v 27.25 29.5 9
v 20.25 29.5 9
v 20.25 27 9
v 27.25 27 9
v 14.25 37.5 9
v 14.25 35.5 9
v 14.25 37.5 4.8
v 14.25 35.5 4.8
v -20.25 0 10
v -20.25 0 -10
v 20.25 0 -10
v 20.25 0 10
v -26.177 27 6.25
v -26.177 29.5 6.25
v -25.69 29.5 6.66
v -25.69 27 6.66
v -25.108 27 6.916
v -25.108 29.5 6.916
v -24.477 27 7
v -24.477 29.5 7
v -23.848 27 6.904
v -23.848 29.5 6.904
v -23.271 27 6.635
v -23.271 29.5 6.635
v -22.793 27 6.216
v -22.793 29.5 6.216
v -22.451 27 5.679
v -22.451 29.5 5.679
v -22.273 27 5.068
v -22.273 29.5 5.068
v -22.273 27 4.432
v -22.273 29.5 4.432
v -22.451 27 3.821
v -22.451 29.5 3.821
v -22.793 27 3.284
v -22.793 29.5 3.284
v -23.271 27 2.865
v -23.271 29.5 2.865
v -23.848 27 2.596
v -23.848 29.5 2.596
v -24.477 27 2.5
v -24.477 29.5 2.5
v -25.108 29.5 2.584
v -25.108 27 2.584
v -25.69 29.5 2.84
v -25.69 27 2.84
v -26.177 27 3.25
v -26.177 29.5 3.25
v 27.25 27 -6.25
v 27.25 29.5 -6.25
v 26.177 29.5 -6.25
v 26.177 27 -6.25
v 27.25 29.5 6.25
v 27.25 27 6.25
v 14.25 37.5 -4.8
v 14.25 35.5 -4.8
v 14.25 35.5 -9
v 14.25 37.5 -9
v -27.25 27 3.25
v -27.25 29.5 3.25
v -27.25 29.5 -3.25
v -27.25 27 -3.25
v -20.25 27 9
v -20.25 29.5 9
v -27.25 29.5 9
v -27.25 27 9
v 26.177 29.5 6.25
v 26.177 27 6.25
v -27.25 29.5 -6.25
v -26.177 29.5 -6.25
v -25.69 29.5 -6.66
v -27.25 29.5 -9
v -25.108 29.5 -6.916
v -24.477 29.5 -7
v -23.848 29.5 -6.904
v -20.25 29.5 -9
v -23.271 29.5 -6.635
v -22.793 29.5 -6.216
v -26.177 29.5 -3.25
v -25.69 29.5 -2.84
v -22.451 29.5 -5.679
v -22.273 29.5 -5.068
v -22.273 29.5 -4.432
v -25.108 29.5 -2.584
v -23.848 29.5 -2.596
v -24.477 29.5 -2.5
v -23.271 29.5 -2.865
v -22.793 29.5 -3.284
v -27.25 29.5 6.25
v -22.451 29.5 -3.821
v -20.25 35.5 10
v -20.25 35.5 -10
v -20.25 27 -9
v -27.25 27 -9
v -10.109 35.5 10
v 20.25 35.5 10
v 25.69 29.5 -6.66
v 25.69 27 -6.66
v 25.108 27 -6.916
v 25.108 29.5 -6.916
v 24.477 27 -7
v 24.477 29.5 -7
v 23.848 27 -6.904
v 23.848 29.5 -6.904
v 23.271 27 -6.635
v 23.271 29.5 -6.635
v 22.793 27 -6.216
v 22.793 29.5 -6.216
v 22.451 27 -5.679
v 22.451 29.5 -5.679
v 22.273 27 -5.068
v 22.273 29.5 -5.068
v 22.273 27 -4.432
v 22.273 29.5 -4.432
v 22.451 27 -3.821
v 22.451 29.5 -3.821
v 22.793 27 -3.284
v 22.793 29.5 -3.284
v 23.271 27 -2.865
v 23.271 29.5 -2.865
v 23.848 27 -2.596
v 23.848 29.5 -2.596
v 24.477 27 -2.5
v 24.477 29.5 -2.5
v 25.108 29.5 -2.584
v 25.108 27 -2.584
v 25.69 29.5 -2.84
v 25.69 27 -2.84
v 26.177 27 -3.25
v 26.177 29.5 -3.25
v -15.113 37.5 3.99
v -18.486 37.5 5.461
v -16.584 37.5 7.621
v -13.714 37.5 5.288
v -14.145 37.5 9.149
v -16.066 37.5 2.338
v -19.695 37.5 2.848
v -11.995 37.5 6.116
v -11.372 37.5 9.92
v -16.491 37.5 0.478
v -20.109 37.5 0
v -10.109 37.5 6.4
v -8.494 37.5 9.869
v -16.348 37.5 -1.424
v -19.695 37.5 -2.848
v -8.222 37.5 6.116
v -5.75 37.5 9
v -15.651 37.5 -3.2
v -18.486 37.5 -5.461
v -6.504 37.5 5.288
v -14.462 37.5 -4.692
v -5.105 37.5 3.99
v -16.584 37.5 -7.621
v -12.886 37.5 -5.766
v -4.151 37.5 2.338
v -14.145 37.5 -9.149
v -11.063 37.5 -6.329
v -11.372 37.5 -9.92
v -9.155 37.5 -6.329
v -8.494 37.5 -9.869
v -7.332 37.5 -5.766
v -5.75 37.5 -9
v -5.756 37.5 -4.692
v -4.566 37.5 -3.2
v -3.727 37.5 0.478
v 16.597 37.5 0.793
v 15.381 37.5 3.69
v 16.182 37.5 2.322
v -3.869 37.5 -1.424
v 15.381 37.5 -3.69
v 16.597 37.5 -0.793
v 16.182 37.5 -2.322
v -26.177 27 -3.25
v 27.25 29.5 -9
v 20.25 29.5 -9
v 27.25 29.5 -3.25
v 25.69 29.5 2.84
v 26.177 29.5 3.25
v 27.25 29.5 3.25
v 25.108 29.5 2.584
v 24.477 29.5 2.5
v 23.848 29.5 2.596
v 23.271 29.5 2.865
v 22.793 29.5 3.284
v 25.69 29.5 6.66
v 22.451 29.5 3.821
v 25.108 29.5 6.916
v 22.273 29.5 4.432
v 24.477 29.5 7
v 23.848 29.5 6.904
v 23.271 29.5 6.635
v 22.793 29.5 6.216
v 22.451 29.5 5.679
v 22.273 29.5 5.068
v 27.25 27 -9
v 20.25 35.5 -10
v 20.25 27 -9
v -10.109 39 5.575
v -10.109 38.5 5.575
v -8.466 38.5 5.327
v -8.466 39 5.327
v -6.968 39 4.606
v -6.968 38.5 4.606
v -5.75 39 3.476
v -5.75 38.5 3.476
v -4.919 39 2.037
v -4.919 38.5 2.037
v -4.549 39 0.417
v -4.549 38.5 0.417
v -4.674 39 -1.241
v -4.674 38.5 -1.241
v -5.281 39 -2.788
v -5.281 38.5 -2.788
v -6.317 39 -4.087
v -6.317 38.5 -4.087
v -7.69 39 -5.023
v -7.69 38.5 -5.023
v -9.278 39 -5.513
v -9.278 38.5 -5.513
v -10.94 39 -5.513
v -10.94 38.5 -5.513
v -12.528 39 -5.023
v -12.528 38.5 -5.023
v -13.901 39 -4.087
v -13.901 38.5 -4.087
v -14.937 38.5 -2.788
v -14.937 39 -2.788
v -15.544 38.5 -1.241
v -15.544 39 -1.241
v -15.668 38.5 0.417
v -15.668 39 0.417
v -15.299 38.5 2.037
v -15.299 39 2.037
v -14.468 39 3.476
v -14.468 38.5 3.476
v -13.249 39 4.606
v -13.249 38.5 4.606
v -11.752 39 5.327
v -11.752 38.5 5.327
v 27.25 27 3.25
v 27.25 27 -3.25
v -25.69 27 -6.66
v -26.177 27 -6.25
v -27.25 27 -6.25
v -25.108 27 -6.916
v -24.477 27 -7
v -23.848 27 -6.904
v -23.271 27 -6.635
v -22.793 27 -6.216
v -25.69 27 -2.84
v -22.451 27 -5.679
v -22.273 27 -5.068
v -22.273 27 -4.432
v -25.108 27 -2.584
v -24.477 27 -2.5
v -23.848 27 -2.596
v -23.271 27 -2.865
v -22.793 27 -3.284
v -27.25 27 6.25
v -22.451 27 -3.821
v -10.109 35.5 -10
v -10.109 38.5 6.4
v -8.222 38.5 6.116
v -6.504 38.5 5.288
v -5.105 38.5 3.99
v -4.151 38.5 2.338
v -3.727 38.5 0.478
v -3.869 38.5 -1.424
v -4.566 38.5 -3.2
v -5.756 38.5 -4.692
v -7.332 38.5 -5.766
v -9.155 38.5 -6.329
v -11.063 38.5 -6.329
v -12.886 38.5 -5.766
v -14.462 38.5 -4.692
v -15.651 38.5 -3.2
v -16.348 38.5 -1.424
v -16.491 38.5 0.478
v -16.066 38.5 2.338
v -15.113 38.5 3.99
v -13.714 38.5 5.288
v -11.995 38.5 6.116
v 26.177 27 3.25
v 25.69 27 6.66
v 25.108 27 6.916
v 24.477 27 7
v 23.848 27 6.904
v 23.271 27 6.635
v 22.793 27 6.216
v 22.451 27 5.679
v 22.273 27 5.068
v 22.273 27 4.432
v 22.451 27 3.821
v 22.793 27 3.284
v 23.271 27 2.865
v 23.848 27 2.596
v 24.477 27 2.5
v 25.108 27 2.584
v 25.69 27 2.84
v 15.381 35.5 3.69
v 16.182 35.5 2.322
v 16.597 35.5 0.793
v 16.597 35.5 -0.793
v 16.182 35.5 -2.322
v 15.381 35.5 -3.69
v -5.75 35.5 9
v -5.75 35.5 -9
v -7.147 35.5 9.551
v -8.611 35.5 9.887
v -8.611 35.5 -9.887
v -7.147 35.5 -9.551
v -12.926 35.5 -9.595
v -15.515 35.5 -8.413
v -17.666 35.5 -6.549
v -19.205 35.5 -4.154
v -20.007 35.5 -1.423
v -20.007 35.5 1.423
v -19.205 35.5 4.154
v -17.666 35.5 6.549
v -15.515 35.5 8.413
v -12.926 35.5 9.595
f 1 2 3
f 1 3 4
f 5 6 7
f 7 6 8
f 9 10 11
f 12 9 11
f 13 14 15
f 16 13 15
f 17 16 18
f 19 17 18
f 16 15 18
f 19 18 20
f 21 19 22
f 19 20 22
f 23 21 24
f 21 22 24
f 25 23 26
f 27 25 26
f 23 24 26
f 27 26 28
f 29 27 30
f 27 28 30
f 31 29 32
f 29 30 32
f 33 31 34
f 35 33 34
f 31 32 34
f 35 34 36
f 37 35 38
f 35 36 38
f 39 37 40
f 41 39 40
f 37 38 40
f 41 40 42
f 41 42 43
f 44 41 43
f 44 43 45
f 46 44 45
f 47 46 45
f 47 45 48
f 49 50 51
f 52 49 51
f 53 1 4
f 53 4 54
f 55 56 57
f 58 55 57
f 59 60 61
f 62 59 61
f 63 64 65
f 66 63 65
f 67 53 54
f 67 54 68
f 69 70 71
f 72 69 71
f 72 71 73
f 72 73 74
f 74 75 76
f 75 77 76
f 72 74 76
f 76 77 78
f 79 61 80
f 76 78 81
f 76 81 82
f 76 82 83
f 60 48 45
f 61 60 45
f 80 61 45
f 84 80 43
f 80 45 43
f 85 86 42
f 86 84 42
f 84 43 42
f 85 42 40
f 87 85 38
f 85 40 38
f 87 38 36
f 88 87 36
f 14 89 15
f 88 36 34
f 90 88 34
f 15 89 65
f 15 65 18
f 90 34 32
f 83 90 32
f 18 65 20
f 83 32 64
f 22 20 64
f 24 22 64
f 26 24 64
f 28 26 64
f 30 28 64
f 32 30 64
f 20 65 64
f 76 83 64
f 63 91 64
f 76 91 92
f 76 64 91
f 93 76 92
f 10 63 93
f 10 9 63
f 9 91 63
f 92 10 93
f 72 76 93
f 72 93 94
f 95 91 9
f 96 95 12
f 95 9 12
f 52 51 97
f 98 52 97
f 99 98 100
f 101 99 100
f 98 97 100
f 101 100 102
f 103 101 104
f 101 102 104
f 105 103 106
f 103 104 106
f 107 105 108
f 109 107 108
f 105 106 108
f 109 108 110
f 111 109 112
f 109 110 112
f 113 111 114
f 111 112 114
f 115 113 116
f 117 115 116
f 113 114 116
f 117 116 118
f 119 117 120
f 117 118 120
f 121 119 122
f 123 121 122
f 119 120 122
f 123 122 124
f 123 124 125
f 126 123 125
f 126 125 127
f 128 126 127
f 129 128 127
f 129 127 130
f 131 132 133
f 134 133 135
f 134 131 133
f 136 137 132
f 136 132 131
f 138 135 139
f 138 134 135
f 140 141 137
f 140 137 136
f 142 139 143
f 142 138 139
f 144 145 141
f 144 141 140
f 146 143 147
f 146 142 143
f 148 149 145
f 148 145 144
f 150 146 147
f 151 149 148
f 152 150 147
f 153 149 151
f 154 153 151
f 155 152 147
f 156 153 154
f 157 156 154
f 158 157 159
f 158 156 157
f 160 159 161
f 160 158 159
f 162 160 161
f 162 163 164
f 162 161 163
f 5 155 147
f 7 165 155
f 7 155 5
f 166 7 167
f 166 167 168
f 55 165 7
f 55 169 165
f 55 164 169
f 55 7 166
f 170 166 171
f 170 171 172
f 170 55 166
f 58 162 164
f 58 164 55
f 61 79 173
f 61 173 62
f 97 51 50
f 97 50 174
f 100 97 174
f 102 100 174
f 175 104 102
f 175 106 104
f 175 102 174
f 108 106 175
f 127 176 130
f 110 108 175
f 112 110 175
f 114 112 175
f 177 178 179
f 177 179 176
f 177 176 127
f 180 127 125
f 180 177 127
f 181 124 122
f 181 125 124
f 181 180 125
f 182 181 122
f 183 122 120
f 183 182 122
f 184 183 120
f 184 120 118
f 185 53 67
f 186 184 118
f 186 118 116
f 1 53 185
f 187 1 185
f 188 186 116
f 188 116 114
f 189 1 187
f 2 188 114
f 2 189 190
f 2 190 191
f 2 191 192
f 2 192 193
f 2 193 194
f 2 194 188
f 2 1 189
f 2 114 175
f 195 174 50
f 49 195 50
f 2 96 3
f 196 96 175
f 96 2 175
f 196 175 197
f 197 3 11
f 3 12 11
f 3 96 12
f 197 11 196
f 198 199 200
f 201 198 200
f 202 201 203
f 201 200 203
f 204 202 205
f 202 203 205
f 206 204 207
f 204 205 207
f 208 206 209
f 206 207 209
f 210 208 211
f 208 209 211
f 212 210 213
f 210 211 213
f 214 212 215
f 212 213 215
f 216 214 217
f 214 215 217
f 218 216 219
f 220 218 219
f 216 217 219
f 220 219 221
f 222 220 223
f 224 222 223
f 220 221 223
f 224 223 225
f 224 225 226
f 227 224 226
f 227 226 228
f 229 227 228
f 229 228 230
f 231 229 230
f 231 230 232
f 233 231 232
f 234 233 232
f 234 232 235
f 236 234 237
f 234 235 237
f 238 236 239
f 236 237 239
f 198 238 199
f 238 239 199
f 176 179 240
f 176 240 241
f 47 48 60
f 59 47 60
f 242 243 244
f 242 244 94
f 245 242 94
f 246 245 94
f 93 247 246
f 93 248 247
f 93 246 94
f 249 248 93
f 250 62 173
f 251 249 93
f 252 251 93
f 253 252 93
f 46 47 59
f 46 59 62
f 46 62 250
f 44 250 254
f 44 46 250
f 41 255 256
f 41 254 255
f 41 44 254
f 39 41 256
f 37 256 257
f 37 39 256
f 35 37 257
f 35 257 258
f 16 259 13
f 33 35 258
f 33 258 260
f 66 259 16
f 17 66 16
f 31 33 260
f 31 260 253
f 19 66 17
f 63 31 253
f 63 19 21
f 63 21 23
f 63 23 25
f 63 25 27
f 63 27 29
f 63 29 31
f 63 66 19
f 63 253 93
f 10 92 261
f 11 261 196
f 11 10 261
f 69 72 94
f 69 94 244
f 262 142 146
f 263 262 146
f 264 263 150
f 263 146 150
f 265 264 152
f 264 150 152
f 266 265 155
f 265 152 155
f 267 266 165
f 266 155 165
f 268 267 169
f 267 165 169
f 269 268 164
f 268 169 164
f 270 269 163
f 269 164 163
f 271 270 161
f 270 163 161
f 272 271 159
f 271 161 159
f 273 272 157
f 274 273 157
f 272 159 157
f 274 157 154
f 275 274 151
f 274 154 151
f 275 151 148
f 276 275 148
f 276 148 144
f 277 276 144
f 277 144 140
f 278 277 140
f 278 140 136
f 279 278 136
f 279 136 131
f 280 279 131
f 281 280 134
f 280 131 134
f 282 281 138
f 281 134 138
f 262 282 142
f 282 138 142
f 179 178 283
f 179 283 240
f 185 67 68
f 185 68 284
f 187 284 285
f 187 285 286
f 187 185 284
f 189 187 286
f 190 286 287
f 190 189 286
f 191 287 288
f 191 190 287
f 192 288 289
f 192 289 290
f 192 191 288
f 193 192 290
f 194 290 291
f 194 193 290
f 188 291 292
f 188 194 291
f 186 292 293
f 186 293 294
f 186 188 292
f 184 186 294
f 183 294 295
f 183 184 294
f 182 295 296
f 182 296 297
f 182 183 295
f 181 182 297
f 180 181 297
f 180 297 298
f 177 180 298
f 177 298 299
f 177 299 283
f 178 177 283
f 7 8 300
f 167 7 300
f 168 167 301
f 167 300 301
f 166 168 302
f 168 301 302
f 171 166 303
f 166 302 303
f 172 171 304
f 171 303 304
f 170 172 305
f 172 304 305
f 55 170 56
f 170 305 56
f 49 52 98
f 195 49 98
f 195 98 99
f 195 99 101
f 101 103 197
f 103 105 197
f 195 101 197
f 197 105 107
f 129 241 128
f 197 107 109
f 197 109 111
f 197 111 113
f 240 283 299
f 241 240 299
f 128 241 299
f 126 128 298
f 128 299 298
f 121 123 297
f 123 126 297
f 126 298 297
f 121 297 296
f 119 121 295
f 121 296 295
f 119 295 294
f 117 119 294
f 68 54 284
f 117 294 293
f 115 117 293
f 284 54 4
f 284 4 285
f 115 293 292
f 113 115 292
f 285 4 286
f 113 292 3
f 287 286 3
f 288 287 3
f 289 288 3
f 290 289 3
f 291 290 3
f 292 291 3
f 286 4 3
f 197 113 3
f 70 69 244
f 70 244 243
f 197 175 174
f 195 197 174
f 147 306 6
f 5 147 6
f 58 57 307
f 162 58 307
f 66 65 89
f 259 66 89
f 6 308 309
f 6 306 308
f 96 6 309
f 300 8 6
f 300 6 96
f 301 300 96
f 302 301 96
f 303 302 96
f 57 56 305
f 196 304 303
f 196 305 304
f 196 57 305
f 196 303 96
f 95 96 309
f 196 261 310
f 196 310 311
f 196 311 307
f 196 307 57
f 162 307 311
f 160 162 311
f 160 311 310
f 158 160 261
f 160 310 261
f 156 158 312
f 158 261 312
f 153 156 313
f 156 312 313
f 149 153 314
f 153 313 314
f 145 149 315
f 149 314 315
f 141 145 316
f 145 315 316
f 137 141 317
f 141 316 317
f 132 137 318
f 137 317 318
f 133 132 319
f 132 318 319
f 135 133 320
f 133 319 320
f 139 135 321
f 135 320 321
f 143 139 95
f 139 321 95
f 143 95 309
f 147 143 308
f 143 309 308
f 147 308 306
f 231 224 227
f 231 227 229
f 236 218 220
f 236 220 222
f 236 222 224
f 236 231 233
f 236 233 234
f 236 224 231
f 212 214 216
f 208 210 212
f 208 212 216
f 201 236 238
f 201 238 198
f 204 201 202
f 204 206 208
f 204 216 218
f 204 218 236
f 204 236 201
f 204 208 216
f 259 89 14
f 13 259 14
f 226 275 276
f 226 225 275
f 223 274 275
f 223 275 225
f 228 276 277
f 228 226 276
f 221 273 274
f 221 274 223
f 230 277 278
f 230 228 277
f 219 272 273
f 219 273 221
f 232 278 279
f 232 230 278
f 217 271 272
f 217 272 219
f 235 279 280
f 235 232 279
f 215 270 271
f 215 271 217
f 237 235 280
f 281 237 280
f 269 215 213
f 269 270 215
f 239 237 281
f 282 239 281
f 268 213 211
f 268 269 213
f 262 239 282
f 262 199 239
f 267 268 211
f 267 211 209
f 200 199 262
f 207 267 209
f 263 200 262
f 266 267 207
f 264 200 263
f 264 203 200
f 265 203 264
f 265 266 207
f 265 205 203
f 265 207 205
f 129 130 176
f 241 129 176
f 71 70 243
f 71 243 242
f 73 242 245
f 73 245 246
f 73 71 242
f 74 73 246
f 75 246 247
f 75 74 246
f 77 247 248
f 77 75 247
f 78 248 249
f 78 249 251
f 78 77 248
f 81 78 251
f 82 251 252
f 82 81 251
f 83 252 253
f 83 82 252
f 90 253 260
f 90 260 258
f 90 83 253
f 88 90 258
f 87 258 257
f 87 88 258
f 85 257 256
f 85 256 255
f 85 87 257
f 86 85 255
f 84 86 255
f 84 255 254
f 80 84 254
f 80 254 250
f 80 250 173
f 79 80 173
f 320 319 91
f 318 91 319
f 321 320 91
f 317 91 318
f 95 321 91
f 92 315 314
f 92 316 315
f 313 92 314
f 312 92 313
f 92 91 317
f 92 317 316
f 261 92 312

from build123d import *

# Parameters (mm, degrees)
SKETCH1_W            = 40.5
SKETCH1_H            = 20
BOSS_EXTRUDE1_DEPTH  = 35.5
BOSS_EXTRUDE2_DEPTH  = 2
SKETCH3_R            = 6.4
BOSS_EXTRUDE3_DEPTH  = 1
SKETCH4_R            = 5.575
BOSS_EXTRUDE4_DEPTH  = 0.5
BOSS_EXTRUDE5_DEPTH  = 2.5
MIRROR2_COPY_1_DEPTH = 2.5


with BuildPart() as part:
    # Sketch1 → Boss-Extrude1 (new body)
    with BuildSketch(Plane(origin=(0, 0, 0), x_dir=(1, 0, 0), z_dir=(0, 1, 0))):
        Rectangle(SKETCH1_W, SKETCH1_H)
    extrude(amount=BOSS_EXTRUDE1_DEPTH)

    # Sketch2 → Boss-Extrude2 (add)
    with BuildSketch(Plane(origin=(0, 35.5, 0), x_dir=(1, 0, 0), z_dir=(0, 1, 0))):
        with BuildLine():
            Line((-5.75, -9), (14.25, -9))
            Line((14.25, -9), (14.25, -4.8))
            ThreePointArc((14.25, -4.8), (16.65, 0), (14.25, 4.8))
            Line((14.25, 4.8), (14.25, 9))
            Line((14.25, 9), (-5.75, 9))
            ThreePointArc((-5.75, 9), (-20.108898944, 0), (-5.75, -9))
        make_face()
    extrude(amount=BOSS_EXTRUDE2_DEPTH)

    # Sketch3 → Boss-Extrude3 (add)
    with BuildSketch(Plane(origin=(0, 37.5, 0), x_dir=(1, 0, 0), z_dir=(0, 1, 0))):
        with Locations(Location((-10.108898944, 0, 0), (0, 0, 270))):
            Circle(SKETCH3_R)
    extrude(amount=BOSS_EXTRUDE3_DEPTH)

    # Sketch4 → Boss-Extrude4 (add)
    with BuildSketch(Plane(origin=(0, 38.5, 0), x_dir=(1, 0, 0), z_dir=(0, 1, 0))):
        with Locations(Location((-10.108898944, 0, 0), (0, 0, 270))):
            Circle(SKETCH4_R)
    extrude(amount=BOSS_EXTRUDE4_DEPTH)

    # Sketch5 → Boss-Extrude5 (add)
    with BuildSketch(Plane(origin=(0, 29.5, 0), x_dir=(1, 0, 0), z_dir=(0, 1, 0))):
        with BuildLine():
            Line((20.25, 9), (27.25, 9))
            Line((27.25, 9), (27.25, 6.25))
            Line((27.25, 6.25), (26.177050983, 6.25))
            ThreePointArc((26.177050983, 6.25), (22.25, 4.75), (26.177050983, 3.25))
            Line((26.177050983, 3.25), (27.25, 3.25))
            Line((27.25, 3.25), (27.25, 0))
            Line((27.25, 0), (20.25, 0))
            Line((20.25, 0), (20.25, 9))
        make_face()
    boss_extrude5 = extrude(amount=-BOSS_EXTRUDE5_DEPTH)

    # Mirror1: Boss-Extrude5 across plane
    add(boss_extrude5.mirror(Plane(origin=(0, 0, 0), x_dir=(0, 0, 1), z_dir=(1, 0, 0))))

    # Mirror2: Boss-Extrude5 across plane
    add(boss_extrude5.mirror(Plane.XY))

    # Mirror2 copy 1 sketch → Mirror2 copy 1 (add)
    with BuildSketch(Plane(origin=(0, 29.5, 0), x_dir=(-1, 0, 0), z_dir=(0, 1, 0))):
        with BuildLine():
            Line((20.25, 9), (27.25, 9))
            Line((27.25, 9), (27.25, 6.25))
            Line((27.25, 6.25), (26.177050983, 6.25))
            ThreePointArc((26.177050983, 6.25), (22.25, 4.75), (26.177050983, 3.25))
            Line((26.177050983, 3.25), (27.25, 3.25))
            Line((27.25, 3.25), (27.25, 0))
            Line((27.25, 0), (20.25, 0))
            Line((20.25, 0), (20.25, 9))
        make_face()
    extrude(amount=-MIRROR2_COPY_1_DEPTH)


solid = part.part
